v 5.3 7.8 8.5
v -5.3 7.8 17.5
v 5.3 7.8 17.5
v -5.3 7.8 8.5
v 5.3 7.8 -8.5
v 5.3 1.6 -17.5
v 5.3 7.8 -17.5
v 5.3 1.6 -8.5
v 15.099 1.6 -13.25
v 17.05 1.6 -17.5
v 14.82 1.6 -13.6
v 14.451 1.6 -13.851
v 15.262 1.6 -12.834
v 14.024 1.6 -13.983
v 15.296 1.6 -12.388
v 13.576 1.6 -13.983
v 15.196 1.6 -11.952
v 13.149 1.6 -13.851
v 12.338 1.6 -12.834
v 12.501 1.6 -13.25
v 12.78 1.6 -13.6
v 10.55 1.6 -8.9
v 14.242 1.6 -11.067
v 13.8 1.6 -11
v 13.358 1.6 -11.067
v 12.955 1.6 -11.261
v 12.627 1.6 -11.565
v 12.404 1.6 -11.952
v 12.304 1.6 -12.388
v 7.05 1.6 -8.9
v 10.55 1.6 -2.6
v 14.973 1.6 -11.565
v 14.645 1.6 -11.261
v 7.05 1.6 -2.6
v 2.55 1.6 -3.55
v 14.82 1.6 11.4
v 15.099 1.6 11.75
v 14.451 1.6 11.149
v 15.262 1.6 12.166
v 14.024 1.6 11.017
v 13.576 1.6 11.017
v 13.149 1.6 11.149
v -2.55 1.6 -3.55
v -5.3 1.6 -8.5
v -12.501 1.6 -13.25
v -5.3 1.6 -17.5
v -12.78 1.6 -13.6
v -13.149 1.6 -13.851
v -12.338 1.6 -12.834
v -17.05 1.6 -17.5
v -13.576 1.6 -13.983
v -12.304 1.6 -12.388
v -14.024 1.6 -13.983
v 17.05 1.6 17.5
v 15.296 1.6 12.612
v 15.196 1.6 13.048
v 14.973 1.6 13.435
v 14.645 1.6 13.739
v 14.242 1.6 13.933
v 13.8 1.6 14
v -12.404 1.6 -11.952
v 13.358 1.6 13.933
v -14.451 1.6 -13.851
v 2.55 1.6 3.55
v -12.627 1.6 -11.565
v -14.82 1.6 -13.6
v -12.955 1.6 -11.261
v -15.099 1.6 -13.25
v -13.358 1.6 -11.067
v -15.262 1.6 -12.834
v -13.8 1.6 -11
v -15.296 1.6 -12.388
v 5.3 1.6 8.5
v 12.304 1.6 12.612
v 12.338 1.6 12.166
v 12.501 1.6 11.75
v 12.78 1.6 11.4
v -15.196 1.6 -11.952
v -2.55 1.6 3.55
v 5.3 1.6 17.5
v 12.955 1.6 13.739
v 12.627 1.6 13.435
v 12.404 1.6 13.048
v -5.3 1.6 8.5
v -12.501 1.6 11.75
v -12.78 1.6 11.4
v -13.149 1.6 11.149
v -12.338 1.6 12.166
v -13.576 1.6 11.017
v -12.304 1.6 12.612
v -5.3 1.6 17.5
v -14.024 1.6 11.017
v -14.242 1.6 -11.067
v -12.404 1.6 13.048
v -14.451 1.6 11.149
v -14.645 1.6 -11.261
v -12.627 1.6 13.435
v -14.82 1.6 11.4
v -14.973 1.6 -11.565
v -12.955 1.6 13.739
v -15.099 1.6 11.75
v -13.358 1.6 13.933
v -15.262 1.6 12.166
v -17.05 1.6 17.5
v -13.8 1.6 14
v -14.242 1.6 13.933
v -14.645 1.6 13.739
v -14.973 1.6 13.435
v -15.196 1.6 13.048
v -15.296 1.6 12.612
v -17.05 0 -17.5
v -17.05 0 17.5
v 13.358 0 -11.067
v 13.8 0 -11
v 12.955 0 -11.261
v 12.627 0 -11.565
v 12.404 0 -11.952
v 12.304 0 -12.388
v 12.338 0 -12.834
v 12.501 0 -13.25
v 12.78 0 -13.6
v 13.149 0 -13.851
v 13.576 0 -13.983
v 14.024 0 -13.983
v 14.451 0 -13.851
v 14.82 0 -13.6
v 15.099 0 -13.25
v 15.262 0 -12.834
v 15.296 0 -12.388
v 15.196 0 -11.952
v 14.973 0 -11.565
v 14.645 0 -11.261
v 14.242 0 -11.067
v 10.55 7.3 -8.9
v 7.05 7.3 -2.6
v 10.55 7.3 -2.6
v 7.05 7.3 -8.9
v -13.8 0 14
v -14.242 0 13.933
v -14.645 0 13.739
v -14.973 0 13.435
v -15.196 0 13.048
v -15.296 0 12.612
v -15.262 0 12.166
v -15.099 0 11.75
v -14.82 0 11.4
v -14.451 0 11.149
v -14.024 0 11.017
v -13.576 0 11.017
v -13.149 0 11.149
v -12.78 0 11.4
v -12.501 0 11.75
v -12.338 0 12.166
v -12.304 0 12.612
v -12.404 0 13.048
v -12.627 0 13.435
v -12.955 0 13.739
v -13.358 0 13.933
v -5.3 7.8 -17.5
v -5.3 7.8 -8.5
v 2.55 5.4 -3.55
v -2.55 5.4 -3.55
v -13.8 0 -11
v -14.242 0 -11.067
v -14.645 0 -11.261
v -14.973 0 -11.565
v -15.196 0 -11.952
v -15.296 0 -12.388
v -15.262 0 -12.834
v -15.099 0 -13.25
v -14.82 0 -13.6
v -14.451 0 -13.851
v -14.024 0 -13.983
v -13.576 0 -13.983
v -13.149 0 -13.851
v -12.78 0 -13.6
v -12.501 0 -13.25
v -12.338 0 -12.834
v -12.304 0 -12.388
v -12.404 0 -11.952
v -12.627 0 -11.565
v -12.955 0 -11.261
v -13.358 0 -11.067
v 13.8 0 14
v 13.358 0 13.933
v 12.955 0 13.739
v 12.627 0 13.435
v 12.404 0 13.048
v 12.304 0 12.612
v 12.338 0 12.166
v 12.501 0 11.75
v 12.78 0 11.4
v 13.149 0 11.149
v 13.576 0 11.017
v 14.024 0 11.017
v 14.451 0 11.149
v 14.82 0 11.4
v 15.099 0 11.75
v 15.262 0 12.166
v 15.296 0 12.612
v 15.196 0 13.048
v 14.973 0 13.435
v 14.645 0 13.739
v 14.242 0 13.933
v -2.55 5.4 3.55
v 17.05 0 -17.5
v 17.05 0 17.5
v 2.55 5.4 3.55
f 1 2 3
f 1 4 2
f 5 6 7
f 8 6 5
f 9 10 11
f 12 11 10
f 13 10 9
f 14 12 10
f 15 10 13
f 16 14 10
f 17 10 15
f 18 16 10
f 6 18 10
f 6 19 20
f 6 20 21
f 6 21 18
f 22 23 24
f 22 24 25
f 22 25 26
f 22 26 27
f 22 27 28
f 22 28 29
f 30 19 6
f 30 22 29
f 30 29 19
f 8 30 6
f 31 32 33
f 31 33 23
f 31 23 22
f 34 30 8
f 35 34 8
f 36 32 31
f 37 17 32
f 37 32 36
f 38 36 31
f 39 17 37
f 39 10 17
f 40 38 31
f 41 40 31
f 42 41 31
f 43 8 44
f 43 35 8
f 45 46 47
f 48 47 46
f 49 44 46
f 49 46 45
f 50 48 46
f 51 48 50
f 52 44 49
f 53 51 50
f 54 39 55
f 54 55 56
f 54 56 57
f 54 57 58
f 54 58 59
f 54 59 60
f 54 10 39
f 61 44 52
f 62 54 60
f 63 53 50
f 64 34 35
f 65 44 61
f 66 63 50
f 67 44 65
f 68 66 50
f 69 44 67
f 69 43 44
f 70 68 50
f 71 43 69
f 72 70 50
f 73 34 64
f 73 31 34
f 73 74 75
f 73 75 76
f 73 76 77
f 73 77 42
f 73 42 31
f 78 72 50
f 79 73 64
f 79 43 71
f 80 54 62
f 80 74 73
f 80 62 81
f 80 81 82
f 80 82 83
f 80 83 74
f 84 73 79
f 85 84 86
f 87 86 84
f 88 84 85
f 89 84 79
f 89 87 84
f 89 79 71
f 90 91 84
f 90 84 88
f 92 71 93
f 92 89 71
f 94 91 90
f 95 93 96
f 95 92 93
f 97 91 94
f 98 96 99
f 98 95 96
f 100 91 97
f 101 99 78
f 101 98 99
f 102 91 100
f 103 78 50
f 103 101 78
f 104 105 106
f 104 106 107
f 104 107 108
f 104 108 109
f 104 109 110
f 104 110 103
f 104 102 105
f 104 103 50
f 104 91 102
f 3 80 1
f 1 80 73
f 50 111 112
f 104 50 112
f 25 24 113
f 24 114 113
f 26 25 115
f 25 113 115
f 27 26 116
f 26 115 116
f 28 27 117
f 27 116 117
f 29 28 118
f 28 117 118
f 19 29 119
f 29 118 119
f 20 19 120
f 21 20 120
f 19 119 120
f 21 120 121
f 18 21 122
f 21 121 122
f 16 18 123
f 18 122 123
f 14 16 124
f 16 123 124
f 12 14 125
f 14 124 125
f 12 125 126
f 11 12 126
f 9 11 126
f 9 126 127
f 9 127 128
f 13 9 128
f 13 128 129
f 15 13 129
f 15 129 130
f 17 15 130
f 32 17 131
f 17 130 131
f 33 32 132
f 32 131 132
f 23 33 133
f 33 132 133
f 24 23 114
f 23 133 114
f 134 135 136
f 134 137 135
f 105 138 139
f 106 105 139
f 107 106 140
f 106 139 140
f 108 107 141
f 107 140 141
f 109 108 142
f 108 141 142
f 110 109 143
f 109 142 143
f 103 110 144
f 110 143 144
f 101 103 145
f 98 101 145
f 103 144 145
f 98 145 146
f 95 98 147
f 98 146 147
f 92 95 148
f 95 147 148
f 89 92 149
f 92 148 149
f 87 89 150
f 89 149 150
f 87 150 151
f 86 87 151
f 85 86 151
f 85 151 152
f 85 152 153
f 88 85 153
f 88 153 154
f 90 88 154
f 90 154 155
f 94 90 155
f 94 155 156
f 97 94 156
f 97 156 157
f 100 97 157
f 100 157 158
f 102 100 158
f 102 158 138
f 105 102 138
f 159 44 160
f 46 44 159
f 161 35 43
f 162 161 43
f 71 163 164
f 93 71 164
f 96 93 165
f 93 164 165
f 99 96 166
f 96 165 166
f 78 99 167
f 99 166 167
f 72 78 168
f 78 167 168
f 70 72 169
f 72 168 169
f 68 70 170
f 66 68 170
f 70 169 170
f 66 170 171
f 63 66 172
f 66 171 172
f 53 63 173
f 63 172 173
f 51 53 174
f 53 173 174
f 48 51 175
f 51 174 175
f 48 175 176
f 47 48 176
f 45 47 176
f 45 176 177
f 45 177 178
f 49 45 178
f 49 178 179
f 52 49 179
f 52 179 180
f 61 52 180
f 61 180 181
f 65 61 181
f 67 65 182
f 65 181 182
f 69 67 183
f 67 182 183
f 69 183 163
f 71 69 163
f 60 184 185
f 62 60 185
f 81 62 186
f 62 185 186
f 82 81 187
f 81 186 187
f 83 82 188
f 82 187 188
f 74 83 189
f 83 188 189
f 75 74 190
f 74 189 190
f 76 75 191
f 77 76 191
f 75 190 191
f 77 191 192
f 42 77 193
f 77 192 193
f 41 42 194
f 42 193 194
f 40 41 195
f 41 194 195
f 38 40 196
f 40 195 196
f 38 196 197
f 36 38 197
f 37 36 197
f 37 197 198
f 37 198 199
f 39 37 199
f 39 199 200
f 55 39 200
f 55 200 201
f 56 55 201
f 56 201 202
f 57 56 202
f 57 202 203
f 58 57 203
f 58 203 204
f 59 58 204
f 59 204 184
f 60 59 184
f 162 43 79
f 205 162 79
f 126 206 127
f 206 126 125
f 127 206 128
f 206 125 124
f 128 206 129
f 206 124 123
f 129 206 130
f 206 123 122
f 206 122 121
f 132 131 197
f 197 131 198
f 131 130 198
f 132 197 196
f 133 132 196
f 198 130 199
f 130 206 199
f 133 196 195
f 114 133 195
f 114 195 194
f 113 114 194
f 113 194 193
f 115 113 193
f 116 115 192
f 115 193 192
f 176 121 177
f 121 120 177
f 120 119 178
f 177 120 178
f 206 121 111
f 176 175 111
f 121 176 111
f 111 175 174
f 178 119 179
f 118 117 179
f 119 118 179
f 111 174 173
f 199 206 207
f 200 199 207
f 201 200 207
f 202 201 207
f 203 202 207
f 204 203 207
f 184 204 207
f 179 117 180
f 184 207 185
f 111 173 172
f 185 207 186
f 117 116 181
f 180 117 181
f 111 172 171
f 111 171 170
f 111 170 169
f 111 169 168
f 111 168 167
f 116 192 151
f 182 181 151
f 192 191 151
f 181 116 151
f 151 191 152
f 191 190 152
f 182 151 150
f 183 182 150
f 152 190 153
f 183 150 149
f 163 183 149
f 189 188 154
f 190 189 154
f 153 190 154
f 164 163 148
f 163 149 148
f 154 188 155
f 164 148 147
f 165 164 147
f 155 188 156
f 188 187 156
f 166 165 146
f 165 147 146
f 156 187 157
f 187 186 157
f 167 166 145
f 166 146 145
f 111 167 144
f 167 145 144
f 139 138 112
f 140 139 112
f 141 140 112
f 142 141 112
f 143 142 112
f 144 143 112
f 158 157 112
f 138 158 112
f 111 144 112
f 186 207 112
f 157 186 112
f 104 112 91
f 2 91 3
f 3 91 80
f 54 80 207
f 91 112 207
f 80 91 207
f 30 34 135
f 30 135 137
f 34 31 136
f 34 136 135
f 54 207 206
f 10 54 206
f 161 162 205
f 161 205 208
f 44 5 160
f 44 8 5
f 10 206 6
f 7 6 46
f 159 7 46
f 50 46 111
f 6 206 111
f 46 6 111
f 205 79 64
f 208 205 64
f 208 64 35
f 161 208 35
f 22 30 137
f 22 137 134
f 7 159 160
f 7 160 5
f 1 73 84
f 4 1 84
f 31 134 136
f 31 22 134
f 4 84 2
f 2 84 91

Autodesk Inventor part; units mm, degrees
ref_plane "YZ Plane" through (0, 0, 0) normal (1, 0, 0) x (0, 1, 0)
ref_plane "XZ Plane" through (0, 0, 0) normal (0, 1, 0) x (-1, 0, 0)
ref_plane "XY Plane" through (0, 0, 0) normal (0, 0, 1) x (1, 0, 0)
sketch "Skizze1" plane through (0, 0, 0) normal (0, 1, 0) x (-1, 0, 0)
  line L0 (17.05, 17.5) -> (-17.05, 17.5)
  line L1 (-17.05, 17.5) -> (-17.05, -17.5)
  line L2 (-17.05, -17.5) -> (17.05, -17.5)
  line L3 (17.05, -17.5) -> (17.05, 17.5)
  point P0 (0, 0)
  dimension "d0" = 35
  dimension "d1" = 34.1
  dimension "d2" = 17.5
  dimension "d3" = 17.05
extrude "Extrusion1" add sketch "Skizze1" along normal blind 1.6
sketch "Skizze3" plane through (0, 1.6, 0) normal (0, 1, 0) x (1, 0, 0)
  line L0 (-17.05, 17.5) -> (-17.05, -17.5) projected
  line L1 (17.05, -17.5) -> (17.05, 17.5) projected
  line L2 (-21.1922, 0) -> (21.294, 0)
  point P0 (0, 0)
  point P1 (-13.8, -12.5)
  point P2 (13.8, 12.5)
  point P3 (13.8, -12.5)
  point P4 (-13.8, 12.5)
  dimension "d13" = 3.25
  dimension "d15" = 3.25
  dimension "d16" = 25
  dimension "d18" = 25
hole "Bohrung2" at (-13.8, 1.6, 12.5) at (13.8, 1.6, -12.5) at (13.8, 1.6, 12.5) at (-13.8, 1.6, -12.5) direction (0, -1, 0) diameter 3 end through all
sketch "Skizze4" plane through (0, 1.6, 0) normal (0, 1, 0) x (1, 0, 0)
  line L0 (17.05, 17.5) -> (-17.05, 17.5) projected
  line L1 (-5.3, 17.5) -> (5.3, 17.5)
  line L2 (5.3, 17.5) -> (5.3, 8.5)
  line L3 (5.3, 8.5) -> (-5.3, 8.5)
  line L4 (-5.3, 8.5) -> (-5.3, 17.5)
  line L5 (0, -9.1387) -> (0, 30.8608)
  line L6 (-26.2563, 0) -> (26.186, 0)
  line L7 (-17.05, -17.5) -> (17.05, -17.5) projected
  line L8 (-5.3, -17.5) -> (5.3, -17.5)
  line L9 (5.3, -17.5) -> (5.3, -8.5)
  line L10 (5.3, -8.5) -> (-5.3, -8.5)
  line L11 (-5.3, -8.5) -> (-5.3, -17.5)
  point P0 (0, 0)
  dimension "d26" = 9
  dimension "d27" = 10.6
extrude "Extrusion2" add sketch "Skizze4" along normal blind 6.2
sketch "Skizze5" plane through (0, 1.6, 0) normal (0, 1, 0) x (1, 0, 0)
  line L0 (10.55, 2.6) -> (7.05, 2.6)
  line L1 (7.05, 2.6) -> (7.05, 8.9)
  line L2 (7.05, 8.9) -> (10.55, 8.9)
  line L3 (10.55, 8.9) -> (10.55, 2.6)
  line L4 (17.05, -17.5) -> (17.05, 17.5) projected
  line L5 (17.05, 17.5) -> (5.3, 17.5) projected
  point P0 (0, 0)
  dimension "d32" = 6.3
  dimension "d33" = 3.5
  dimension "d34" = 6.5
  dimension "d35" = 8.6
extrude "Extrusion3" add sketch "Skizze5" along normal blind 5.7
sketch "Skizze6" plane through (0, 1.6, 0) normal (0, 1, 0) x (1, 0, 0)
  line L0 (-2.55, -3.55) -> (2.55, -3.55)
  line L1 (2.55, -3.55) -> (2.55, 3.55)
  line L2 (2.55, 3.55) -> (-2.55, 3.55)
  line L3 (-2.55, 3.55) -> (-2.55, -3.55)
  line L4 (-17.05, 17.5) -> (-17.05, -17.5) projected
  line L5 (5.3, 17.5) -> (-5.3, 17.5) projected
  point P0 (0, 0)
  dimension "d38" = 7.1
  dimension "d39" = 5.1
  dimension "d40" = 14.5
  dimension "d41" = 13.95
extrude "Extrusion4" add sketch "Skizze6" along normal blind 3.8
properties part number "Prozessorboard"
